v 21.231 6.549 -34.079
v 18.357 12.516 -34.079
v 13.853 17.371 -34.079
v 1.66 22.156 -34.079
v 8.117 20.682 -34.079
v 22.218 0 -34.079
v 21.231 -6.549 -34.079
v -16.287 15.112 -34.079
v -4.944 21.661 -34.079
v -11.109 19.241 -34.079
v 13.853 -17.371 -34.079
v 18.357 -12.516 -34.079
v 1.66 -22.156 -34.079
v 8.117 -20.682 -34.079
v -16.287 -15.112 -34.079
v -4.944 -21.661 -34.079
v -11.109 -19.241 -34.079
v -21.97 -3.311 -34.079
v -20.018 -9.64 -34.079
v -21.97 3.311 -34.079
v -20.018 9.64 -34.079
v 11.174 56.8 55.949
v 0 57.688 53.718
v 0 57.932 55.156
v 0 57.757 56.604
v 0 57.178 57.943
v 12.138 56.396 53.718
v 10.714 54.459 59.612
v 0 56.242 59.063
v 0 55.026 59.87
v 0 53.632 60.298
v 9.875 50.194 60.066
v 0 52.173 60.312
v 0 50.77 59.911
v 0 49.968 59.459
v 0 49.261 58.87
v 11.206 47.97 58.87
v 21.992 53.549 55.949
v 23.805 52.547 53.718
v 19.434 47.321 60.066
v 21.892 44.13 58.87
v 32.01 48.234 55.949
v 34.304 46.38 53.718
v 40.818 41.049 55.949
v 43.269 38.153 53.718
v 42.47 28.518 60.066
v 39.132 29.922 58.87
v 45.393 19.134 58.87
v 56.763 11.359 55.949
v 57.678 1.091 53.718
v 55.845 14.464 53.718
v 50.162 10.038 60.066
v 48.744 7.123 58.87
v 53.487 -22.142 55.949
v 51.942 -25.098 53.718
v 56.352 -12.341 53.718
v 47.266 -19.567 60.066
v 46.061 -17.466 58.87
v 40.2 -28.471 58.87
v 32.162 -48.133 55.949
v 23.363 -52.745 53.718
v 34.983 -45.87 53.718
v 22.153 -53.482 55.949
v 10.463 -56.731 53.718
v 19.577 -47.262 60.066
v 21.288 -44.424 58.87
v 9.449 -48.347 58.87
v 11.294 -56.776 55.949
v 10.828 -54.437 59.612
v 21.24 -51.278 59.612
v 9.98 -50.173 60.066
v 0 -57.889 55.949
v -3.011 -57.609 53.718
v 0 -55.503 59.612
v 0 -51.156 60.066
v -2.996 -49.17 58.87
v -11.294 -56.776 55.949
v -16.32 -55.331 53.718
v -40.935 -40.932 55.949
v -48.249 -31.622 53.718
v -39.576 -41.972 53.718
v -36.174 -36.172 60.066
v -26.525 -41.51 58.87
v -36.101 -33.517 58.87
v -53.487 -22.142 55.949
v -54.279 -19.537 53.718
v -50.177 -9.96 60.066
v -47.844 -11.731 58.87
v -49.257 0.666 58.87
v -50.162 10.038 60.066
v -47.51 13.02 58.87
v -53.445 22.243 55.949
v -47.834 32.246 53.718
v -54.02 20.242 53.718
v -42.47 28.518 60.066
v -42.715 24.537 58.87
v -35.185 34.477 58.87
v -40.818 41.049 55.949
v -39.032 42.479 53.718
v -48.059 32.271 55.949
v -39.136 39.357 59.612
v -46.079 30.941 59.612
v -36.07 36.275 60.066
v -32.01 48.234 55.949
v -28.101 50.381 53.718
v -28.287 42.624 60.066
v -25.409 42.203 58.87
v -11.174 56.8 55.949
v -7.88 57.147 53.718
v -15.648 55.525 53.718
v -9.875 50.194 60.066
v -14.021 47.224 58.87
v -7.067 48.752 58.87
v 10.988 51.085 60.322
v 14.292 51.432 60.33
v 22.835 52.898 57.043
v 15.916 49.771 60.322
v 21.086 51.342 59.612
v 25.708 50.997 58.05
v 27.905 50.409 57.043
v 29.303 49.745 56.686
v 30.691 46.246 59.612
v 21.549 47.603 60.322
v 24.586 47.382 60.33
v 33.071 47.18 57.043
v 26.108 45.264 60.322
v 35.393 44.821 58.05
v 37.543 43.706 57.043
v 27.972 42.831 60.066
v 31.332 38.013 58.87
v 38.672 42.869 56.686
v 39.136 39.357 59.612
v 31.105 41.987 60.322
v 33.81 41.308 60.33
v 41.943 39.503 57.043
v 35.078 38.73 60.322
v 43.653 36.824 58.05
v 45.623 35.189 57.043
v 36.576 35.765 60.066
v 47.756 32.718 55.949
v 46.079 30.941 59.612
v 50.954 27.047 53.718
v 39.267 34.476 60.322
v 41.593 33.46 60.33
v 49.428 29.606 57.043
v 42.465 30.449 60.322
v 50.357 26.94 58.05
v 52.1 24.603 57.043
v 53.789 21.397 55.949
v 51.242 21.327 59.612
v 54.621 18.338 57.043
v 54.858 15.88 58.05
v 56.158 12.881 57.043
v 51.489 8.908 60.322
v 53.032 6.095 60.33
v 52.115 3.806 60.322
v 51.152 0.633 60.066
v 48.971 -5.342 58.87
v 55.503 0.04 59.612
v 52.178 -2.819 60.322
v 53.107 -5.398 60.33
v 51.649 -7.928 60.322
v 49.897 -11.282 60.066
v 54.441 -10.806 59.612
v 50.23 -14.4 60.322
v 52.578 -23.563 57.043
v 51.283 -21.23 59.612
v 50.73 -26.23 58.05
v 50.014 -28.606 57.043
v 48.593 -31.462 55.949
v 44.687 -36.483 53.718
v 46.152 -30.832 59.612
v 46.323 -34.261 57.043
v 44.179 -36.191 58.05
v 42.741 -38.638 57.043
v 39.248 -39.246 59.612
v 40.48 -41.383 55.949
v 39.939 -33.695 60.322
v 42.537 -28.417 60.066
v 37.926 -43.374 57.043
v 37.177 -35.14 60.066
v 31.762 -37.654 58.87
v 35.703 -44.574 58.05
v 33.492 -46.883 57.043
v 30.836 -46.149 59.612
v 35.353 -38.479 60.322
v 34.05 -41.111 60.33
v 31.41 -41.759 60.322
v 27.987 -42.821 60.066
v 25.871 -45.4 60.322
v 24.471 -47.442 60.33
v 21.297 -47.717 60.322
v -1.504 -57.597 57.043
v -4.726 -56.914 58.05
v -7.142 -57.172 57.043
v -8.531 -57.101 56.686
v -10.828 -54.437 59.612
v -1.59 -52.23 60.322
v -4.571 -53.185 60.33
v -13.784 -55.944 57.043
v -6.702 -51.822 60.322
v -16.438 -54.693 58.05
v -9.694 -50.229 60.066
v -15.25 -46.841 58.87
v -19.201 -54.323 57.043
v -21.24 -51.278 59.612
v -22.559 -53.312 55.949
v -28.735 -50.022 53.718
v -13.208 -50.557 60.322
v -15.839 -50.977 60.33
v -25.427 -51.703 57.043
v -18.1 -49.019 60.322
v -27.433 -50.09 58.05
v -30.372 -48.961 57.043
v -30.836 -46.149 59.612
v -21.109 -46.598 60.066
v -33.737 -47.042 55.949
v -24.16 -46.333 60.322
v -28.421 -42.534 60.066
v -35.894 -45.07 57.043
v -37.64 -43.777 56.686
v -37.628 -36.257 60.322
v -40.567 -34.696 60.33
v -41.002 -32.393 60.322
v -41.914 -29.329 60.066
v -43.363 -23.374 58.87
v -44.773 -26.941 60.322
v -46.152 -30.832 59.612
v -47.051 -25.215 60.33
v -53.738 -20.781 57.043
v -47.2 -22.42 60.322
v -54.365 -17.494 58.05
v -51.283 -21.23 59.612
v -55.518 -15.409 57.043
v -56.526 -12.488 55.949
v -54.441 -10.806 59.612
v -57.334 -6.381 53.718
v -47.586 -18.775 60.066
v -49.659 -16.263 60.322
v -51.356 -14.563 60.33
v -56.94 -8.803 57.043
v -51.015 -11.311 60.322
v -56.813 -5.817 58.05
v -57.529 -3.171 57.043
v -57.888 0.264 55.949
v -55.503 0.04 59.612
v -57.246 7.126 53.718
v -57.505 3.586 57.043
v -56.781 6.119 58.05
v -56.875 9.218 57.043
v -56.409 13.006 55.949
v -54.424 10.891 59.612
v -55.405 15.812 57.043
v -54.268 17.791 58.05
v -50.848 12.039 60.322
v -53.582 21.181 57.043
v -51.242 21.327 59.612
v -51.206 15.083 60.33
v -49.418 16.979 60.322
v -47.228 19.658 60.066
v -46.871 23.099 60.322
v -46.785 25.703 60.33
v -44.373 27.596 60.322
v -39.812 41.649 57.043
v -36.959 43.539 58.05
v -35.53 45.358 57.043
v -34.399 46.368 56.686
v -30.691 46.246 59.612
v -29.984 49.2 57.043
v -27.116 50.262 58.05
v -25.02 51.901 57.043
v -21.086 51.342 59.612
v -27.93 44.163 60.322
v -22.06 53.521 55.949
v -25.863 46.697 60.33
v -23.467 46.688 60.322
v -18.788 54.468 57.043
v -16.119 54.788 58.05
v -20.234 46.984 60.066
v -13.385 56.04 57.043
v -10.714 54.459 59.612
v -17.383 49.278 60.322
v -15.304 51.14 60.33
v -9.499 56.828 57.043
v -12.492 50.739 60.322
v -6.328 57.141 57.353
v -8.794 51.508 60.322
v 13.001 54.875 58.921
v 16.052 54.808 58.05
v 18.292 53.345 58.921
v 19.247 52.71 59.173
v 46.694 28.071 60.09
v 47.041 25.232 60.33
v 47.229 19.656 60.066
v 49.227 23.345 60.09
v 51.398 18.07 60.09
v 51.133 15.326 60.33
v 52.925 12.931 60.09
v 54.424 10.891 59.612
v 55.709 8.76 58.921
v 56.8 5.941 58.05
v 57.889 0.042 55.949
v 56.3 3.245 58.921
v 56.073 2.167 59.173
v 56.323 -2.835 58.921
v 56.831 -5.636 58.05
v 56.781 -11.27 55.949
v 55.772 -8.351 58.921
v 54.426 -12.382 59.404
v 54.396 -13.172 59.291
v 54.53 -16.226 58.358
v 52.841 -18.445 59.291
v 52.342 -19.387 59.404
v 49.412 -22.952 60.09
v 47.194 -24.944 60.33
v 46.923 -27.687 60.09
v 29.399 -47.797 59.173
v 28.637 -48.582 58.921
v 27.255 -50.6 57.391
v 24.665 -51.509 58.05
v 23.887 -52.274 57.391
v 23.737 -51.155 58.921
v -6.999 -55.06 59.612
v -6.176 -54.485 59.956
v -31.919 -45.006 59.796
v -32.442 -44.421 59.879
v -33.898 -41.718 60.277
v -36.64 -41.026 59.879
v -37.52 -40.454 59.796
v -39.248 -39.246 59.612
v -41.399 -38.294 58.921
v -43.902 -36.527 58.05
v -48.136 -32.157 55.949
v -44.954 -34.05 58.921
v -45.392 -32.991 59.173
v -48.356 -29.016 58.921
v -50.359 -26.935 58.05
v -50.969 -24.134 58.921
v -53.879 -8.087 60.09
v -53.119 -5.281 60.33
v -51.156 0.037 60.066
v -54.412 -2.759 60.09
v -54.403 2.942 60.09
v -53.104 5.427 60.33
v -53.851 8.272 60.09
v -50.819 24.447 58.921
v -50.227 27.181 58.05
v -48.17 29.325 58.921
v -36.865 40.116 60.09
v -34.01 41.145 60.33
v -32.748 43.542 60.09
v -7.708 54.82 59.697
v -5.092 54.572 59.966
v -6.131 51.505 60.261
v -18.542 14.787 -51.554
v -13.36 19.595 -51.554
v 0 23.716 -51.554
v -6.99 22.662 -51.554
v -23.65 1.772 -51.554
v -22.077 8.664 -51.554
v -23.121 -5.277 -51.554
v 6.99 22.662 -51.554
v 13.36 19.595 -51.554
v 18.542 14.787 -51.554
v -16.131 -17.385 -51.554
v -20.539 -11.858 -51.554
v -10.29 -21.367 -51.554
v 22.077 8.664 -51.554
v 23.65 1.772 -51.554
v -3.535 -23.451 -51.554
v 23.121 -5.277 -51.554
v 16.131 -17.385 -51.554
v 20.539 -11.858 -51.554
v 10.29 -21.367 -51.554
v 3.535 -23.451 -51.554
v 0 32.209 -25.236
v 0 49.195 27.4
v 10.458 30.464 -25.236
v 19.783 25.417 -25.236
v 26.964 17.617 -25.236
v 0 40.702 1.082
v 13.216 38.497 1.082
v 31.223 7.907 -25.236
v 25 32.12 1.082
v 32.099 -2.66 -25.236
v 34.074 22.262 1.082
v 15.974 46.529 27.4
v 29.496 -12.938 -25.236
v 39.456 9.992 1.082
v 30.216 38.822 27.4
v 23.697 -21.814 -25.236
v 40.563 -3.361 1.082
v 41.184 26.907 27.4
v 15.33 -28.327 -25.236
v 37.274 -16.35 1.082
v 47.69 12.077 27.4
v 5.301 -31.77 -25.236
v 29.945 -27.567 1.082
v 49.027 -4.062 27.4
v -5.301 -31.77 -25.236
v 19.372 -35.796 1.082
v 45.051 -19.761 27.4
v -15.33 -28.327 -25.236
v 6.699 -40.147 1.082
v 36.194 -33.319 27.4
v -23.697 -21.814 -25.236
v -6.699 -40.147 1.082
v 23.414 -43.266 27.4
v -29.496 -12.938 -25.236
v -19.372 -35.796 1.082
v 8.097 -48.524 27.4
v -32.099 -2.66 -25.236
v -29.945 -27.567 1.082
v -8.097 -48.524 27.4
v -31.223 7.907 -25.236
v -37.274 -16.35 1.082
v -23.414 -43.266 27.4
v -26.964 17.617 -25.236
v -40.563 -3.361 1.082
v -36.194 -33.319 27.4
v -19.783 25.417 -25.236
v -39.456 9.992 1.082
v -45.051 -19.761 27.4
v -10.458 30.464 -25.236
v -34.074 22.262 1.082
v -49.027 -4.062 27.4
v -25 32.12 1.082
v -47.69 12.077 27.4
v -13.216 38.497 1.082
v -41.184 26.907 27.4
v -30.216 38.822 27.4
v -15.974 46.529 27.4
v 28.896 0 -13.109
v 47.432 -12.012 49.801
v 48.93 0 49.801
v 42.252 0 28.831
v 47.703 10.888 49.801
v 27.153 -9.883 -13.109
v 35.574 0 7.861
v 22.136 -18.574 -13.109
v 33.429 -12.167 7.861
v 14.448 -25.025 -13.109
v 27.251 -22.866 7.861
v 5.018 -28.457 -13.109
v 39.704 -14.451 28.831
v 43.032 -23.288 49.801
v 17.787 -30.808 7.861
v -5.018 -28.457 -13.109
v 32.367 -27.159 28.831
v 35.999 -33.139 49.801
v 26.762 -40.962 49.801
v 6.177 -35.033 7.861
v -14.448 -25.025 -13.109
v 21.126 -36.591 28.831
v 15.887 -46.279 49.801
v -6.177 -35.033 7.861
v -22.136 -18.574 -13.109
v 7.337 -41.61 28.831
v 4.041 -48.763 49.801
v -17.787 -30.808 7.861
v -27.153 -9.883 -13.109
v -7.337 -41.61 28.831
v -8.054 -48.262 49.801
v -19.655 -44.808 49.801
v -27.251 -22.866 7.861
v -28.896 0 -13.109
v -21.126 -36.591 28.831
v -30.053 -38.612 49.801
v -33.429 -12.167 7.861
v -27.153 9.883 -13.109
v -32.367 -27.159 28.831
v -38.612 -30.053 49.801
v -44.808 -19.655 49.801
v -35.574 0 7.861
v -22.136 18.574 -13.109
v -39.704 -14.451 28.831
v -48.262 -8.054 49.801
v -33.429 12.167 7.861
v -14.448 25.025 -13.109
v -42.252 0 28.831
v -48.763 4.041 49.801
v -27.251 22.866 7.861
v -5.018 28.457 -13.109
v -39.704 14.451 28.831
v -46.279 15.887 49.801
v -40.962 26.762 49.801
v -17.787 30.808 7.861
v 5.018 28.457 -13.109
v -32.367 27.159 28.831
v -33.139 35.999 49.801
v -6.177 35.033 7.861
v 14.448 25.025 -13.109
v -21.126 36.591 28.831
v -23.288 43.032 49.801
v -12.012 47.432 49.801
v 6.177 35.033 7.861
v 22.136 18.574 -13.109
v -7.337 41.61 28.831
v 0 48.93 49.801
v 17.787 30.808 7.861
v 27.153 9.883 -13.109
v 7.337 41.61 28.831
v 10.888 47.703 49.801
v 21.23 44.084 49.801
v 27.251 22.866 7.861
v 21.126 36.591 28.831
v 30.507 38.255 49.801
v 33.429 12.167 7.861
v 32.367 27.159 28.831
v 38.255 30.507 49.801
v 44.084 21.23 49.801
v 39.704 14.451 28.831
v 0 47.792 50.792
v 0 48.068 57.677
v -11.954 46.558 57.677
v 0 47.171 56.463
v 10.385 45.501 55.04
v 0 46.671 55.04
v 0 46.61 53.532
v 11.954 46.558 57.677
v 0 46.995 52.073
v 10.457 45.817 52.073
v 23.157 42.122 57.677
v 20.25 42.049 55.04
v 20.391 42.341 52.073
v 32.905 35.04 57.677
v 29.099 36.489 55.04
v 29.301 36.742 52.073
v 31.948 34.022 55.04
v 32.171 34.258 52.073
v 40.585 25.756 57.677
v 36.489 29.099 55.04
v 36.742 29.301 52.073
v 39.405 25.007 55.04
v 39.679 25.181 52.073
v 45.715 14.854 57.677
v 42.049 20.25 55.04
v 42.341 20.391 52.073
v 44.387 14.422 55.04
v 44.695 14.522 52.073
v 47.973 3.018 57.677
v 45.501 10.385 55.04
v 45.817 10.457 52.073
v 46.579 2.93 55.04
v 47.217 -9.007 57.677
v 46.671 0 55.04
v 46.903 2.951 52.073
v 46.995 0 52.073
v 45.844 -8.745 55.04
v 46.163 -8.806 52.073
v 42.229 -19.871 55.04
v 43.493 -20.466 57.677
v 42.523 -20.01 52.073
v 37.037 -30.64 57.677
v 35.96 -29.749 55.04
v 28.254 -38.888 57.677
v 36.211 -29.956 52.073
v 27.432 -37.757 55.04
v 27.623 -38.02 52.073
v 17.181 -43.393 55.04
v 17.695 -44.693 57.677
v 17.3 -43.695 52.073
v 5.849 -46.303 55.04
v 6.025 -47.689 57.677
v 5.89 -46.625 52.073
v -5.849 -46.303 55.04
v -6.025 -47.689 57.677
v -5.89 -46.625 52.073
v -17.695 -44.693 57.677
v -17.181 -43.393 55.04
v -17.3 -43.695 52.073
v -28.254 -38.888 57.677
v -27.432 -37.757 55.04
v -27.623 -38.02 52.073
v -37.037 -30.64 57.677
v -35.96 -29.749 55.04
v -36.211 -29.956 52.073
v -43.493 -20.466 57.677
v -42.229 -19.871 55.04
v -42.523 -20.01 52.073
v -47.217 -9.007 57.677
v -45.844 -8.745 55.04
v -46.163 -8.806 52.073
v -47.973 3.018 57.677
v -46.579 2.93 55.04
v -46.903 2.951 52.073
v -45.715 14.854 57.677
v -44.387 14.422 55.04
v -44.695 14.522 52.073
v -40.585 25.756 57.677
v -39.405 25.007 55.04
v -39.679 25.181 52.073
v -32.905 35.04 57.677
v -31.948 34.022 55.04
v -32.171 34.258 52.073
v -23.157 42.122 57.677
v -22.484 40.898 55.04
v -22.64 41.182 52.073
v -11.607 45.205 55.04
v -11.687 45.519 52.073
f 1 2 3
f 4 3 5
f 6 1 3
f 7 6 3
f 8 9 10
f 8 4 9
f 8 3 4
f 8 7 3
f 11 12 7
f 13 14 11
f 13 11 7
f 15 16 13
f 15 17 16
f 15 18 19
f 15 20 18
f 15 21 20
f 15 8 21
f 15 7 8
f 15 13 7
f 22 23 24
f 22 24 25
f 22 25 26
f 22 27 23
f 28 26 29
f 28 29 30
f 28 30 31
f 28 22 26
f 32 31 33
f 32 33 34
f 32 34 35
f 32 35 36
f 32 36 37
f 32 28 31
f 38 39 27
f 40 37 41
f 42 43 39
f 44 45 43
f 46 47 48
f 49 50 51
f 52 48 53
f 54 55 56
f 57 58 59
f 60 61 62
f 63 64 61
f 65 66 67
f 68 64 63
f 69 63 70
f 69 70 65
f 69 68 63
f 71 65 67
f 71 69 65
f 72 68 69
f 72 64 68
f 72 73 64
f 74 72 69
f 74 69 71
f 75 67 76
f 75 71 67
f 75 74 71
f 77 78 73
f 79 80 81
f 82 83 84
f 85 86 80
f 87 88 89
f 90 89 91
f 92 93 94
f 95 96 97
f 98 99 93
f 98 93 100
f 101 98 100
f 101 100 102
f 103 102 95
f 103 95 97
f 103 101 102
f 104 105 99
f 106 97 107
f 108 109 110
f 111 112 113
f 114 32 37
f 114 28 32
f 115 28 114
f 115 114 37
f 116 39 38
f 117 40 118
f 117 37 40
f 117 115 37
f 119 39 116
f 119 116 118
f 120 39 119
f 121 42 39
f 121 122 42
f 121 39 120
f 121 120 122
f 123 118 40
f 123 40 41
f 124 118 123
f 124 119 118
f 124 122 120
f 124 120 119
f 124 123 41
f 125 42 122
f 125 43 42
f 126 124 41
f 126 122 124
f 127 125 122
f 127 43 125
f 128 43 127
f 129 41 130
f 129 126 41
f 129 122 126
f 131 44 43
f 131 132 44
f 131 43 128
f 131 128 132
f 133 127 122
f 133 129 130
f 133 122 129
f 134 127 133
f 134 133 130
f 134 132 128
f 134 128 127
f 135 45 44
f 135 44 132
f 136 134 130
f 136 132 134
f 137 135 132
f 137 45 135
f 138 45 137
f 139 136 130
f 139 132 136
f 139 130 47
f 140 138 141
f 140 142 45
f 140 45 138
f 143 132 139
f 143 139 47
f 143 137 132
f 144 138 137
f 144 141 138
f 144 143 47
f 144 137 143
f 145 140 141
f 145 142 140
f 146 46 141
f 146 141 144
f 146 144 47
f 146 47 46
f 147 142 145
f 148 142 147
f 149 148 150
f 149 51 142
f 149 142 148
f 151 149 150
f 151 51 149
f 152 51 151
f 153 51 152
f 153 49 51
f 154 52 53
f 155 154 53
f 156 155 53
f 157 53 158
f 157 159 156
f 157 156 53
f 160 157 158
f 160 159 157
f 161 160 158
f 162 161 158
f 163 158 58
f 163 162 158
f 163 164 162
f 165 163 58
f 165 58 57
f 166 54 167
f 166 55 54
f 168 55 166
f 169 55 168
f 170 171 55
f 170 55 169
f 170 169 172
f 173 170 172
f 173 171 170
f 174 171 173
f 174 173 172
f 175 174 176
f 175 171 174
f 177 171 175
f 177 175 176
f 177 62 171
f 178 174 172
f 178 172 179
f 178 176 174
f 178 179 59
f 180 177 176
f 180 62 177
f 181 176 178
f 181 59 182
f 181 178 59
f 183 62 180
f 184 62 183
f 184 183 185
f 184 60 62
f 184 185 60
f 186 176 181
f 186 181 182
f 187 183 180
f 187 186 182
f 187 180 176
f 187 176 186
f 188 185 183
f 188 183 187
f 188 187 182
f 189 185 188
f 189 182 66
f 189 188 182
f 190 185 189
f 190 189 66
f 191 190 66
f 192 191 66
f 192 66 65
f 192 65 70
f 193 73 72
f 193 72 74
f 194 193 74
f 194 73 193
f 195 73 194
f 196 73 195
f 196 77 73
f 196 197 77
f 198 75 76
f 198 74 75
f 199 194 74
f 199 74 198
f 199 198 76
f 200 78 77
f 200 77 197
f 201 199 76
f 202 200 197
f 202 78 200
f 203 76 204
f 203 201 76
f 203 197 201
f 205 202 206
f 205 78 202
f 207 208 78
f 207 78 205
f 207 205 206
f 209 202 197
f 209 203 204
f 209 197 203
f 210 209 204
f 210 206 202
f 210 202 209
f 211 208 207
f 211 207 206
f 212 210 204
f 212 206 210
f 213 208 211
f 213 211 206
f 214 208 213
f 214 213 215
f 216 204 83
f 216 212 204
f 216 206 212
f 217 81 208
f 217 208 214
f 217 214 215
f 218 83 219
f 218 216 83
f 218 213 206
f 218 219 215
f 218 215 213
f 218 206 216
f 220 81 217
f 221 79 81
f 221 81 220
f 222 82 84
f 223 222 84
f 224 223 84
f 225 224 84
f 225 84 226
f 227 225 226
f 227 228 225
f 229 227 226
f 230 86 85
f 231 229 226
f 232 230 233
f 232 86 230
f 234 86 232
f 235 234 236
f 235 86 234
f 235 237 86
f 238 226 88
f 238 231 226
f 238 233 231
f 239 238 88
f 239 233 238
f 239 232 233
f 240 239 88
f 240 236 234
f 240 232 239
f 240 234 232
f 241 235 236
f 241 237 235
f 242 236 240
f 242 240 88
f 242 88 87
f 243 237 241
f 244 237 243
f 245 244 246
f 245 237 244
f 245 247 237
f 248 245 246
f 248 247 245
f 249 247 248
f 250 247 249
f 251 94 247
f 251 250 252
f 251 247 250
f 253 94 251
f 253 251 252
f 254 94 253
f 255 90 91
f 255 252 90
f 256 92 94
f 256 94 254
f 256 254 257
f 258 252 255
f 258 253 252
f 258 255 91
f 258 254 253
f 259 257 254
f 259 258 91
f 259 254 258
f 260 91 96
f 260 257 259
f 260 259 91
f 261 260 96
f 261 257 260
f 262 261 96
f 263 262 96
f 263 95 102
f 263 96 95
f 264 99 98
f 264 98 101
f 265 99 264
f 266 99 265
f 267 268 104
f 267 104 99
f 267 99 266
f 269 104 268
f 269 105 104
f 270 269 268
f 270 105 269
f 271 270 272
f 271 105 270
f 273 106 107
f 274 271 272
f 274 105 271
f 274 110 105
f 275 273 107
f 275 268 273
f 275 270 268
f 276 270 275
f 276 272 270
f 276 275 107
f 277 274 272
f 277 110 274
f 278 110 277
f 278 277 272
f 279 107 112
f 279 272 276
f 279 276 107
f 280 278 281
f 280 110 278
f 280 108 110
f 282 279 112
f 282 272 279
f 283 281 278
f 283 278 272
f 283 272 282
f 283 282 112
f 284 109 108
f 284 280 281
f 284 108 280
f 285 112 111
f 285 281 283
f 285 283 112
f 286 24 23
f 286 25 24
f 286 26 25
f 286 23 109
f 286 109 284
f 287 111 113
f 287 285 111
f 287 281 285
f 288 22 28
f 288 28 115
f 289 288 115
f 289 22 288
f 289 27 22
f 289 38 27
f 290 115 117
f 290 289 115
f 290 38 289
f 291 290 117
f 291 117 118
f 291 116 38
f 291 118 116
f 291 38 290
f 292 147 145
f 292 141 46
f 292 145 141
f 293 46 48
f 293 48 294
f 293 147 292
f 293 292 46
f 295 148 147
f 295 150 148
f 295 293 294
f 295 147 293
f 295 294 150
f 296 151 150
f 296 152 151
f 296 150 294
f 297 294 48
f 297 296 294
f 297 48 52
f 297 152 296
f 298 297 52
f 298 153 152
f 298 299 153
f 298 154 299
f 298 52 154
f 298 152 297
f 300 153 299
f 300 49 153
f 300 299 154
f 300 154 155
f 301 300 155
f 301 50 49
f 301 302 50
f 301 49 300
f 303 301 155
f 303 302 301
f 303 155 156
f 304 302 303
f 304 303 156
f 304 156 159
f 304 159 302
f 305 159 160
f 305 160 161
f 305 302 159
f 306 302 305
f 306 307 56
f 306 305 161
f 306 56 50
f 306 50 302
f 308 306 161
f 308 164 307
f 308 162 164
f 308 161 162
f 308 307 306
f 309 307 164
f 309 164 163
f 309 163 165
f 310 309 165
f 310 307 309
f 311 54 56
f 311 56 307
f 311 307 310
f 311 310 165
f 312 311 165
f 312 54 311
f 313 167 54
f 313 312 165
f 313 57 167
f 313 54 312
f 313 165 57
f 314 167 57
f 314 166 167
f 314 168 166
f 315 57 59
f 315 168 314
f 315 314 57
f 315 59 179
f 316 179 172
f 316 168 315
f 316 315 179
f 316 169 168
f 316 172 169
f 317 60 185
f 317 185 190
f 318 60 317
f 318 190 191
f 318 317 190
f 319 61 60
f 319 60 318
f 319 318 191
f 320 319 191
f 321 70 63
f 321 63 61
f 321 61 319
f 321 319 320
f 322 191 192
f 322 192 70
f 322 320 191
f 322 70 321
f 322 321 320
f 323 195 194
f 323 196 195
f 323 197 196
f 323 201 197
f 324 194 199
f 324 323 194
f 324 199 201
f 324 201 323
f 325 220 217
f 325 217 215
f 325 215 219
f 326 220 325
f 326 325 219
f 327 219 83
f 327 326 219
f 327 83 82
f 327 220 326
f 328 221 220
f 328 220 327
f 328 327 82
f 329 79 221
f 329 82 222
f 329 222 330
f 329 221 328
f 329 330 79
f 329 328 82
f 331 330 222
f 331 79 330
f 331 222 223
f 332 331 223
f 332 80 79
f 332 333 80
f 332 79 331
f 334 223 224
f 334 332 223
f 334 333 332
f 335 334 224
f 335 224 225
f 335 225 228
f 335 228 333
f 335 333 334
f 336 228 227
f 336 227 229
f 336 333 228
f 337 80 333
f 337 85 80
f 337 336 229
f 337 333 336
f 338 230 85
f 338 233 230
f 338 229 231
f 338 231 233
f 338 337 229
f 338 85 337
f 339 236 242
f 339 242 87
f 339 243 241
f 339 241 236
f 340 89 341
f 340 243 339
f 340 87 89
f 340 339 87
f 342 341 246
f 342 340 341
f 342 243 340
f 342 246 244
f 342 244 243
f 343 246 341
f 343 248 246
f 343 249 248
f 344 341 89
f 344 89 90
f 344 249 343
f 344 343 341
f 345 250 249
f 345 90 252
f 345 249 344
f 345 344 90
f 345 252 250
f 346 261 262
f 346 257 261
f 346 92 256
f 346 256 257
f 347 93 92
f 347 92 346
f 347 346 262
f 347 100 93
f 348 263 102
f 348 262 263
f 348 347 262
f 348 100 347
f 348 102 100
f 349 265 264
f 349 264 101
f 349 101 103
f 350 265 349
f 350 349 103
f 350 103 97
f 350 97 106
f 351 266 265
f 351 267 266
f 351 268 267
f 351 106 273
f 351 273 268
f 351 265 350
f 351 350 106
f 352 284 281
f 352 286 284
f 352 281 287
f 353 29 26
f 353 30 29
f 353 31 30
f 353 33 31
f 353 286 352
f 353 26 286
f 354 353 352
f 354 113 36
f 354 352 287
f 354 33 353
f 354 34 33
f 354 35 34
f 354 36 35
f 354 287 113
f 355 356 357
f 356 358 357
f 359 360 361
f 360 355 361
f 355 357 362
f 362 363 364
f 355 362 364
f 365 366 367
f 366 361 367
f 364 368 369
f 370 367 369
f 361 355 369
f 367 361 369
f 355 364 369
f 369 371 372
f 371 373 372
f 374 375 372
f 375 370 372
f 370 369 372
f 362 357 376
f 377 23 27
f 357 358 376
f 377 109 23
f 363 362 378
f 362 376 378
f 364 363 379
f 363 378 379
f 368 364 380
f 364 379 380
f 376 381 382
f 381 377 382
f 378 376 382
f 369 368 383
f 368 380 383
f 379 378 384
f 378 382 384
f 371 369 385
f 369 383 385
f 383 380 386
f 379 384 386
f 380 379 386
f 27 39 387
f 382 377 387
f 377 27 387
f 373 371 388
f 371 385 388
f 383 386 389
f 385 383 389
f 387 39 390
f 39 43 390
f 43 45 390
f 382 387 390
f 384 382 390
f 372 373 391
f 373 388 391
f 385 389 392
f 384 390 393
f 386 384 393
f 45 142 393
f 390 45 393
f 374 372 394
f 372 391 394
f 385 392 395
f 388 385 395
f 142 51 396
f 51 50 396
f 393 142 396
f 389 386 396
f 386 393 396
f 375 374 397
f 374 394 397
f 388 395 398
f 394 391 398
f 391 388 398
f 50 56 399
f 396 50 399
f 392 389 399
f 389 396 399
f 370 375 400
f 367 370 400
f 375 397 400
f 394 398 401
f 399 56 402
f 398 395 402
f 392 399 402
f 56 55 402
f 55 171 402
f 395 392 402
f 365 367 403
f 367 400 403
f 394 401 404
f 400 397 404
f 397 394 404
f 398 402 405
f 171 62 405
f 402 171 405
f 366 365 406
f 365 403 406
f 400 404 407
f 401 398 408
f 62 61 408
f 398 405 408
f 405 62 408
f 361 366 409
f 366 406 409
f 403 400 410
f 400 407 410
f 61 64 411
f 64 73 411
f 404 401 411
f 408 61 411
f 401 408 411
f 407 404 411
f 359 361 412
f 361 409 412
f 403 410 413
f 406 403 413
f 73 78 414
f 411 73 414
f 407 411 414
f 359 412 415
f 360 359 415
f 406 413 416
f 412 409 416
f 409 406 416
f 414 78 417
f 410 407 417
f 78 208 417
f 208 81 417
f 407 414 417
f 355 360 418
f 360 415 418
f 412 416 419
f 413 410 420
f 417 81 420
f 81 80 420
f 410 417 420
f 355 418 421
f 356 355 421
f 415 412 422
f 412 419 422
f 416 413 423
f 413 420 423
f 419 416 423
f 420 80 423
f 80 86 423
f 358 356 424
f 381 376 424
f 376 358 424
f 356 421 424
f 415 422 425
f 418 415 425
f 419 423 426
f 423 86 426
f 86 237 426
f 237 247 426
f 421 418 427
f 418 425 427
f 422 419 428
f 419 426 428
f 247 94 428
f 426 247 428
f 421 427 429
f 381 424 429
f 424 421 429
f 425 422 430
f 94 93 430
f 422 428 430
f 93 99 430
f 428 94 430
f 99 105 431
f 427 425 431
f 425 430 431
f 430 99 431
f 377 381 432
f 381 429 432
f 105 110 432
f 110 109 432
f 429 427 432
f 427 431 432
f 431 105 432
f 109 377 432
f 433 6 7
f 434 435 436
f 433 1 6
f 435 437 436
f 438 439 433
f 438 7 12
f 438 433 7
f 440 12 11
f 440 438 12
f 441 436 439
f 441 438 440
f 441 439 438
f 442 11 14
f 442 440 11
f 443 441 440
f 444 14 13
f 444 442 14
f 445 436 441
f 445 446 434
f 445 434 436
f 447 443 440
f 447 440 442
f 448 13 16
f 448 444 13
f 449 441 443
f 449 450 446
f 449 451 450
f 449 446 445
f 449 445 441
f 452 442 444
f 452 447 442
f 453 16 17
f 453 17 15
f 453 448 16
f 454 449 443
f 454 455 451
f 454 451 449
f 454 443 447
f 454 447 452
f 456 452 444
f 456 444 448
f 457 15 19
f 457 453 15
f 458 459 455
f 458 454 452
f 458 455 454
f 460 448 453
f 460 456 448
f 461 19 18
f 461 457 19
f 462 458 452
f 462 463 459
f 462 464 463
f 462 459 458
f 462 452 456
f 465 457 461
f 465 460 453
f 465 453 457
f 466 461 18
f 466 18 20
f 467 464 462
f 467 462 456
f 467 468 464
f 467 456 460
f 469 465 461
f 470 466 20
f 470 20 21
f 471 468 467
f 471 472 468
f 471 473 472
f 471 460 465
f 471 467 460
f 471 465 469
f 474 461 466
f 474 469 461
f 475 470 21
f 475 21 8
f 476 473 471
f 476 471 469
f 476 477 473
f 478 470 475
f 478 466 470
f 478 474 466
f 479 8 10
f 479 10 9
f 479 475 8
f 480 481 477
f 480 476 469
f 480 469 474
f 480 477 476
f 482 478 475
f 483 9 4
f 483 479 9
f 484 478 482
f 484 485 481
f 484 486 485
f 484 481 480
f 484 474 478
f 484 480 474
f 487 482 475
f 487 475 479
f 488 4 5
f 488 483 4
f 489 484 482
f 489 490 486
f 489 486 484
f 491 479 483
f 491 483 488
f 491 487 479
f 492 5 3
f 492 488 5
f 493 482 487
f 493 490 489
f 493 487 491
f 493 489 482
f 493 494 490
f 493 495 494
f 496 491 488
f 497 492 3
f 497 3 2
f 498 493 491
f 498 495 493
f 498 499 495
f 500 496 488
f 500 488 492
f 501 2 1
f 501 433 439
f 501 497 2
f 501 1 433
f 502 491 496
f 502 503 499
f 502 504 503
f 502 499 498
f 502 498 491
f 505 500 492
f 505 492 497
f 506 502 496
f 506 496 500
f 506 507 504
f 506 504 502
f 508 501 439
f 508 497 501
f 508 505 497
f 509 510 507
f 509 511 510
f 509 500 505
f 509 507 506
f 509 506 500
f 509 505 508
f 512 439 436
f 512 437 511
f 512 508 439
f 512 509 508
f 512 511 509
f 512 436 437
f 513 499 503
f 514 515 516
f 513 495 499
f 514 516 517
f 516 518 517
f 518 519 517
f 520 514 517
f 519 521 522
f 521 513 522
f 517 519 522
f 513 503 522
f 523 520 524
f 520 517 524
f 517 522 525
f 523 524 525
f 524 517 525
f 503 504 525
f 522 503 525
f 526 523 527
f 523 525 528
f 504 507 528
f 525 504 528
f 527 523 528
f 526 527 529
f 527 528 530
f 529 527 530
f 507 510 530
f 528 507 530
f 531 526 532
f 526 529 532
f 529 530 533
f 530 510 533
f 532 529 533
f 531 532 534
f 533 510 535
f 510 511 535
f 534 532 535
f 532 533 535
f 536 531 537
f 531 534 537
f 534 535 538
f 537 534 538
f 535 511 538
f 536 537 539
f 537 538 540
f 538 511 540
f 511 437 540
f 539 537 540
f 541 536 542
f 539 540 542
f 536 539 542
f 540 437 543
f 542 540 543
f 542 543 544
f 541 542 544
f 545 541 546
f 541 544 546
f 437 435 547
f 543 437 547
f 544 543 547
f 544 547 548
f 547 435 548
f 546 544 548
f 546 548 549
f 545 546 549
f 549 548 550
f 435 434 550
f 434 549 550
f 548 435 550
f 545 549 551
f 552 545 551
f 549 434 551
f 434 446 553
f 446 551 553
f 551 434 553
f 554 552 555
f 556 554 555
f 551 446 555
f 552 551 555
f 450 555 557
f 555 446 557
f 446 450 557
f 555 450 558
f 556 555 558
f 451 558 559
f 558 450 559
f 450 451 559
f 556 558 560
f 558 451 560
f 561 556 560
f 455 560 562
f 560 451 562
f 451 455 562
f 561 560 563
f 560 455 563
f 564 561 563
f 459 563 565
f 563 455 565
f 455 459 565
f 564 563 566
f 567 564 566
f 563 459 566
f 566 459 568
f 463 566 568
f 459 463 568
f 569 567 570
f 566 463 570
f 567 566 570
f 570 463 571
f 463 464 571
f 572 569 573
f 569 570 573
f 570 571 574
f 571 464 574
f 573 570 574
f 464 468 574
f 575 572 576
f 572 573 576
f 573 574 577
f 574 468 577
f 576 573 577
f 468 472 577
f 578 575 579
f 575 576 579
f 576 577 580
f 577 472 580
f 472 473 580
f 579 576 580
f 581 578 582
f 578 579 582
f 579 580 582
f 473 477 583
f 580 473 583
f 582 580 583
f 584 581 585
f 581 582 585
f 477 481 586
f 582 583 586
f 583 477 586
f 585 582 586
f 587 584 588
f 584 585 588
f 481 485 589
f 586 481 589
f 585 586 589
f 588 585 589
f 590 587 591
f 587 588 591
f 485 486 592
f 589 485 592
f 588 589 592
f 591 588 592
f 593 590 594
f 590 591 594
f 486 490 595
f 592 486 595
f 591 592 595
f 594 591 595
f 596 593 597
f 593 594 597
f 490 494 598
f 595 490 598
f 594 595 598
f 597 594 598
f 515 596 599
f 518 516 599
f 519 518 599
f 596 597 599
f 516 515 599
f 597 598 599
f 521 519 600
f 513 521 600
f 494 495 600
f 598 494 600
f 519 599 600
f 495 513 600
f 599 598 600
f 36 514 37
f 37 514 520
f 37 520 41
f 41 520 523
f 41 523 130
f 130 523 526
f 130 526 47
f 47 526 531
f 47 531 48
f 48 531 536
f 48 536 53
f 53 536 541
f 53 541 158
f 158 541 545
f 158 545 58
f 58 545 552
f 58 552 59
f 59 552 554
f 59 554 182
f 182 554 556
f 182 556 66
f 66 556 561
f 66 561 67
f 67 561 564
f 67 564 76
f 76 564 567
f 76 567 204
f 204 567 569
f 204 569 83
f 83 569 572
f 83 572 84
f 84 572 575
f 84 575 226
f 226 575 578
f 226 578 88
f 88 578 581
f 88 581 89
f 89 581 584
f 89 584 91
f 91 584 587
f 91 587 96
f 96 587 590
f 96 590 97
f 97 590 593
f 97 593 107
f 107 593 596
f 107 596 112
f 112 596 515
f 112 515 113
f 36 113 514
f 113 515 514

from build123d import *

# Parameters (mm, degrees)
F2_R = 5.08


# Not quite as in the source:
# - a fillet or chamfer that OpenCascade refuses, or shapes differently, is made with other operations: its cross-section is extruded or revolved along the edge and cut away or added


with BuildPart() as f1:
    # F0 (on Right) → F1 (revolve)
    with BuildSketch(Plane.YZ):
        Polygon((31.2051475048, 40.8137366176), (0, 38.317322731), (0, -51.5535026789), (23.7159132957, -51.5535026789), (64.1577839851, 73.7663730979), align=None)
    revolve(axis=Axis((0, 0, -6.6180899739), (0, 0, -1)))

    # F2
    f2_edges = [f1.edges().sort_by_distance(p)[0] for p in [
        (0, -64.157784, 73.766373),
    ]]
    fillet(f2_edges, radius=F2_R)

    # F3 (on Front) → F4 (revolve, cut)
    with BuildSketch(Plane.XZ):
        Polygon((48.9296764135, 49.8008169234), (0, 49.8008169234), (0, -34.0786203742), (22.218067199, -34.0786203742), align=None)
    revolve(axis=Axis((0, 0, 7.8610982746), (0, 0, -1)), mode=Mode.SUBTRACT)

    # F5: fillet of radius 5.08 on 1 edges, made by hand

    # F5_s1 → F5_t2 (revolve, cut)
    with BuildSketch(Plane.YZ):
        with BuildLine():
            ThreePointArc((48.0680960352, 57.6766851479), (46.6103251908, 53.5321519556), (48.9296764135, 49.8008169234))
            Line((48.9296764135, 49.8008169234), (48.8750659721, 49.7151416079))
            ThreePointArc((48.8750659721, 49.7151416079), (44.5609521121, 49.6992169234), (40.1922278106, 49.6992169234))
            Line((40.1922278106, 49.6992169234), (40.1203857617, 49.8726589723))
            Line((40.1203857617, 49.8726589723), (47.9962539862, 57.7485271969))
            Line((47.9962539862, 57.7485271969), (48.0680960352, 57.6766851479))
        make_face()
    revolve(axis=Axis((0, 0, 49.8008169234), (0, 0, -1)), mode=Mode.SUBTRACT)


solid = f1.part
